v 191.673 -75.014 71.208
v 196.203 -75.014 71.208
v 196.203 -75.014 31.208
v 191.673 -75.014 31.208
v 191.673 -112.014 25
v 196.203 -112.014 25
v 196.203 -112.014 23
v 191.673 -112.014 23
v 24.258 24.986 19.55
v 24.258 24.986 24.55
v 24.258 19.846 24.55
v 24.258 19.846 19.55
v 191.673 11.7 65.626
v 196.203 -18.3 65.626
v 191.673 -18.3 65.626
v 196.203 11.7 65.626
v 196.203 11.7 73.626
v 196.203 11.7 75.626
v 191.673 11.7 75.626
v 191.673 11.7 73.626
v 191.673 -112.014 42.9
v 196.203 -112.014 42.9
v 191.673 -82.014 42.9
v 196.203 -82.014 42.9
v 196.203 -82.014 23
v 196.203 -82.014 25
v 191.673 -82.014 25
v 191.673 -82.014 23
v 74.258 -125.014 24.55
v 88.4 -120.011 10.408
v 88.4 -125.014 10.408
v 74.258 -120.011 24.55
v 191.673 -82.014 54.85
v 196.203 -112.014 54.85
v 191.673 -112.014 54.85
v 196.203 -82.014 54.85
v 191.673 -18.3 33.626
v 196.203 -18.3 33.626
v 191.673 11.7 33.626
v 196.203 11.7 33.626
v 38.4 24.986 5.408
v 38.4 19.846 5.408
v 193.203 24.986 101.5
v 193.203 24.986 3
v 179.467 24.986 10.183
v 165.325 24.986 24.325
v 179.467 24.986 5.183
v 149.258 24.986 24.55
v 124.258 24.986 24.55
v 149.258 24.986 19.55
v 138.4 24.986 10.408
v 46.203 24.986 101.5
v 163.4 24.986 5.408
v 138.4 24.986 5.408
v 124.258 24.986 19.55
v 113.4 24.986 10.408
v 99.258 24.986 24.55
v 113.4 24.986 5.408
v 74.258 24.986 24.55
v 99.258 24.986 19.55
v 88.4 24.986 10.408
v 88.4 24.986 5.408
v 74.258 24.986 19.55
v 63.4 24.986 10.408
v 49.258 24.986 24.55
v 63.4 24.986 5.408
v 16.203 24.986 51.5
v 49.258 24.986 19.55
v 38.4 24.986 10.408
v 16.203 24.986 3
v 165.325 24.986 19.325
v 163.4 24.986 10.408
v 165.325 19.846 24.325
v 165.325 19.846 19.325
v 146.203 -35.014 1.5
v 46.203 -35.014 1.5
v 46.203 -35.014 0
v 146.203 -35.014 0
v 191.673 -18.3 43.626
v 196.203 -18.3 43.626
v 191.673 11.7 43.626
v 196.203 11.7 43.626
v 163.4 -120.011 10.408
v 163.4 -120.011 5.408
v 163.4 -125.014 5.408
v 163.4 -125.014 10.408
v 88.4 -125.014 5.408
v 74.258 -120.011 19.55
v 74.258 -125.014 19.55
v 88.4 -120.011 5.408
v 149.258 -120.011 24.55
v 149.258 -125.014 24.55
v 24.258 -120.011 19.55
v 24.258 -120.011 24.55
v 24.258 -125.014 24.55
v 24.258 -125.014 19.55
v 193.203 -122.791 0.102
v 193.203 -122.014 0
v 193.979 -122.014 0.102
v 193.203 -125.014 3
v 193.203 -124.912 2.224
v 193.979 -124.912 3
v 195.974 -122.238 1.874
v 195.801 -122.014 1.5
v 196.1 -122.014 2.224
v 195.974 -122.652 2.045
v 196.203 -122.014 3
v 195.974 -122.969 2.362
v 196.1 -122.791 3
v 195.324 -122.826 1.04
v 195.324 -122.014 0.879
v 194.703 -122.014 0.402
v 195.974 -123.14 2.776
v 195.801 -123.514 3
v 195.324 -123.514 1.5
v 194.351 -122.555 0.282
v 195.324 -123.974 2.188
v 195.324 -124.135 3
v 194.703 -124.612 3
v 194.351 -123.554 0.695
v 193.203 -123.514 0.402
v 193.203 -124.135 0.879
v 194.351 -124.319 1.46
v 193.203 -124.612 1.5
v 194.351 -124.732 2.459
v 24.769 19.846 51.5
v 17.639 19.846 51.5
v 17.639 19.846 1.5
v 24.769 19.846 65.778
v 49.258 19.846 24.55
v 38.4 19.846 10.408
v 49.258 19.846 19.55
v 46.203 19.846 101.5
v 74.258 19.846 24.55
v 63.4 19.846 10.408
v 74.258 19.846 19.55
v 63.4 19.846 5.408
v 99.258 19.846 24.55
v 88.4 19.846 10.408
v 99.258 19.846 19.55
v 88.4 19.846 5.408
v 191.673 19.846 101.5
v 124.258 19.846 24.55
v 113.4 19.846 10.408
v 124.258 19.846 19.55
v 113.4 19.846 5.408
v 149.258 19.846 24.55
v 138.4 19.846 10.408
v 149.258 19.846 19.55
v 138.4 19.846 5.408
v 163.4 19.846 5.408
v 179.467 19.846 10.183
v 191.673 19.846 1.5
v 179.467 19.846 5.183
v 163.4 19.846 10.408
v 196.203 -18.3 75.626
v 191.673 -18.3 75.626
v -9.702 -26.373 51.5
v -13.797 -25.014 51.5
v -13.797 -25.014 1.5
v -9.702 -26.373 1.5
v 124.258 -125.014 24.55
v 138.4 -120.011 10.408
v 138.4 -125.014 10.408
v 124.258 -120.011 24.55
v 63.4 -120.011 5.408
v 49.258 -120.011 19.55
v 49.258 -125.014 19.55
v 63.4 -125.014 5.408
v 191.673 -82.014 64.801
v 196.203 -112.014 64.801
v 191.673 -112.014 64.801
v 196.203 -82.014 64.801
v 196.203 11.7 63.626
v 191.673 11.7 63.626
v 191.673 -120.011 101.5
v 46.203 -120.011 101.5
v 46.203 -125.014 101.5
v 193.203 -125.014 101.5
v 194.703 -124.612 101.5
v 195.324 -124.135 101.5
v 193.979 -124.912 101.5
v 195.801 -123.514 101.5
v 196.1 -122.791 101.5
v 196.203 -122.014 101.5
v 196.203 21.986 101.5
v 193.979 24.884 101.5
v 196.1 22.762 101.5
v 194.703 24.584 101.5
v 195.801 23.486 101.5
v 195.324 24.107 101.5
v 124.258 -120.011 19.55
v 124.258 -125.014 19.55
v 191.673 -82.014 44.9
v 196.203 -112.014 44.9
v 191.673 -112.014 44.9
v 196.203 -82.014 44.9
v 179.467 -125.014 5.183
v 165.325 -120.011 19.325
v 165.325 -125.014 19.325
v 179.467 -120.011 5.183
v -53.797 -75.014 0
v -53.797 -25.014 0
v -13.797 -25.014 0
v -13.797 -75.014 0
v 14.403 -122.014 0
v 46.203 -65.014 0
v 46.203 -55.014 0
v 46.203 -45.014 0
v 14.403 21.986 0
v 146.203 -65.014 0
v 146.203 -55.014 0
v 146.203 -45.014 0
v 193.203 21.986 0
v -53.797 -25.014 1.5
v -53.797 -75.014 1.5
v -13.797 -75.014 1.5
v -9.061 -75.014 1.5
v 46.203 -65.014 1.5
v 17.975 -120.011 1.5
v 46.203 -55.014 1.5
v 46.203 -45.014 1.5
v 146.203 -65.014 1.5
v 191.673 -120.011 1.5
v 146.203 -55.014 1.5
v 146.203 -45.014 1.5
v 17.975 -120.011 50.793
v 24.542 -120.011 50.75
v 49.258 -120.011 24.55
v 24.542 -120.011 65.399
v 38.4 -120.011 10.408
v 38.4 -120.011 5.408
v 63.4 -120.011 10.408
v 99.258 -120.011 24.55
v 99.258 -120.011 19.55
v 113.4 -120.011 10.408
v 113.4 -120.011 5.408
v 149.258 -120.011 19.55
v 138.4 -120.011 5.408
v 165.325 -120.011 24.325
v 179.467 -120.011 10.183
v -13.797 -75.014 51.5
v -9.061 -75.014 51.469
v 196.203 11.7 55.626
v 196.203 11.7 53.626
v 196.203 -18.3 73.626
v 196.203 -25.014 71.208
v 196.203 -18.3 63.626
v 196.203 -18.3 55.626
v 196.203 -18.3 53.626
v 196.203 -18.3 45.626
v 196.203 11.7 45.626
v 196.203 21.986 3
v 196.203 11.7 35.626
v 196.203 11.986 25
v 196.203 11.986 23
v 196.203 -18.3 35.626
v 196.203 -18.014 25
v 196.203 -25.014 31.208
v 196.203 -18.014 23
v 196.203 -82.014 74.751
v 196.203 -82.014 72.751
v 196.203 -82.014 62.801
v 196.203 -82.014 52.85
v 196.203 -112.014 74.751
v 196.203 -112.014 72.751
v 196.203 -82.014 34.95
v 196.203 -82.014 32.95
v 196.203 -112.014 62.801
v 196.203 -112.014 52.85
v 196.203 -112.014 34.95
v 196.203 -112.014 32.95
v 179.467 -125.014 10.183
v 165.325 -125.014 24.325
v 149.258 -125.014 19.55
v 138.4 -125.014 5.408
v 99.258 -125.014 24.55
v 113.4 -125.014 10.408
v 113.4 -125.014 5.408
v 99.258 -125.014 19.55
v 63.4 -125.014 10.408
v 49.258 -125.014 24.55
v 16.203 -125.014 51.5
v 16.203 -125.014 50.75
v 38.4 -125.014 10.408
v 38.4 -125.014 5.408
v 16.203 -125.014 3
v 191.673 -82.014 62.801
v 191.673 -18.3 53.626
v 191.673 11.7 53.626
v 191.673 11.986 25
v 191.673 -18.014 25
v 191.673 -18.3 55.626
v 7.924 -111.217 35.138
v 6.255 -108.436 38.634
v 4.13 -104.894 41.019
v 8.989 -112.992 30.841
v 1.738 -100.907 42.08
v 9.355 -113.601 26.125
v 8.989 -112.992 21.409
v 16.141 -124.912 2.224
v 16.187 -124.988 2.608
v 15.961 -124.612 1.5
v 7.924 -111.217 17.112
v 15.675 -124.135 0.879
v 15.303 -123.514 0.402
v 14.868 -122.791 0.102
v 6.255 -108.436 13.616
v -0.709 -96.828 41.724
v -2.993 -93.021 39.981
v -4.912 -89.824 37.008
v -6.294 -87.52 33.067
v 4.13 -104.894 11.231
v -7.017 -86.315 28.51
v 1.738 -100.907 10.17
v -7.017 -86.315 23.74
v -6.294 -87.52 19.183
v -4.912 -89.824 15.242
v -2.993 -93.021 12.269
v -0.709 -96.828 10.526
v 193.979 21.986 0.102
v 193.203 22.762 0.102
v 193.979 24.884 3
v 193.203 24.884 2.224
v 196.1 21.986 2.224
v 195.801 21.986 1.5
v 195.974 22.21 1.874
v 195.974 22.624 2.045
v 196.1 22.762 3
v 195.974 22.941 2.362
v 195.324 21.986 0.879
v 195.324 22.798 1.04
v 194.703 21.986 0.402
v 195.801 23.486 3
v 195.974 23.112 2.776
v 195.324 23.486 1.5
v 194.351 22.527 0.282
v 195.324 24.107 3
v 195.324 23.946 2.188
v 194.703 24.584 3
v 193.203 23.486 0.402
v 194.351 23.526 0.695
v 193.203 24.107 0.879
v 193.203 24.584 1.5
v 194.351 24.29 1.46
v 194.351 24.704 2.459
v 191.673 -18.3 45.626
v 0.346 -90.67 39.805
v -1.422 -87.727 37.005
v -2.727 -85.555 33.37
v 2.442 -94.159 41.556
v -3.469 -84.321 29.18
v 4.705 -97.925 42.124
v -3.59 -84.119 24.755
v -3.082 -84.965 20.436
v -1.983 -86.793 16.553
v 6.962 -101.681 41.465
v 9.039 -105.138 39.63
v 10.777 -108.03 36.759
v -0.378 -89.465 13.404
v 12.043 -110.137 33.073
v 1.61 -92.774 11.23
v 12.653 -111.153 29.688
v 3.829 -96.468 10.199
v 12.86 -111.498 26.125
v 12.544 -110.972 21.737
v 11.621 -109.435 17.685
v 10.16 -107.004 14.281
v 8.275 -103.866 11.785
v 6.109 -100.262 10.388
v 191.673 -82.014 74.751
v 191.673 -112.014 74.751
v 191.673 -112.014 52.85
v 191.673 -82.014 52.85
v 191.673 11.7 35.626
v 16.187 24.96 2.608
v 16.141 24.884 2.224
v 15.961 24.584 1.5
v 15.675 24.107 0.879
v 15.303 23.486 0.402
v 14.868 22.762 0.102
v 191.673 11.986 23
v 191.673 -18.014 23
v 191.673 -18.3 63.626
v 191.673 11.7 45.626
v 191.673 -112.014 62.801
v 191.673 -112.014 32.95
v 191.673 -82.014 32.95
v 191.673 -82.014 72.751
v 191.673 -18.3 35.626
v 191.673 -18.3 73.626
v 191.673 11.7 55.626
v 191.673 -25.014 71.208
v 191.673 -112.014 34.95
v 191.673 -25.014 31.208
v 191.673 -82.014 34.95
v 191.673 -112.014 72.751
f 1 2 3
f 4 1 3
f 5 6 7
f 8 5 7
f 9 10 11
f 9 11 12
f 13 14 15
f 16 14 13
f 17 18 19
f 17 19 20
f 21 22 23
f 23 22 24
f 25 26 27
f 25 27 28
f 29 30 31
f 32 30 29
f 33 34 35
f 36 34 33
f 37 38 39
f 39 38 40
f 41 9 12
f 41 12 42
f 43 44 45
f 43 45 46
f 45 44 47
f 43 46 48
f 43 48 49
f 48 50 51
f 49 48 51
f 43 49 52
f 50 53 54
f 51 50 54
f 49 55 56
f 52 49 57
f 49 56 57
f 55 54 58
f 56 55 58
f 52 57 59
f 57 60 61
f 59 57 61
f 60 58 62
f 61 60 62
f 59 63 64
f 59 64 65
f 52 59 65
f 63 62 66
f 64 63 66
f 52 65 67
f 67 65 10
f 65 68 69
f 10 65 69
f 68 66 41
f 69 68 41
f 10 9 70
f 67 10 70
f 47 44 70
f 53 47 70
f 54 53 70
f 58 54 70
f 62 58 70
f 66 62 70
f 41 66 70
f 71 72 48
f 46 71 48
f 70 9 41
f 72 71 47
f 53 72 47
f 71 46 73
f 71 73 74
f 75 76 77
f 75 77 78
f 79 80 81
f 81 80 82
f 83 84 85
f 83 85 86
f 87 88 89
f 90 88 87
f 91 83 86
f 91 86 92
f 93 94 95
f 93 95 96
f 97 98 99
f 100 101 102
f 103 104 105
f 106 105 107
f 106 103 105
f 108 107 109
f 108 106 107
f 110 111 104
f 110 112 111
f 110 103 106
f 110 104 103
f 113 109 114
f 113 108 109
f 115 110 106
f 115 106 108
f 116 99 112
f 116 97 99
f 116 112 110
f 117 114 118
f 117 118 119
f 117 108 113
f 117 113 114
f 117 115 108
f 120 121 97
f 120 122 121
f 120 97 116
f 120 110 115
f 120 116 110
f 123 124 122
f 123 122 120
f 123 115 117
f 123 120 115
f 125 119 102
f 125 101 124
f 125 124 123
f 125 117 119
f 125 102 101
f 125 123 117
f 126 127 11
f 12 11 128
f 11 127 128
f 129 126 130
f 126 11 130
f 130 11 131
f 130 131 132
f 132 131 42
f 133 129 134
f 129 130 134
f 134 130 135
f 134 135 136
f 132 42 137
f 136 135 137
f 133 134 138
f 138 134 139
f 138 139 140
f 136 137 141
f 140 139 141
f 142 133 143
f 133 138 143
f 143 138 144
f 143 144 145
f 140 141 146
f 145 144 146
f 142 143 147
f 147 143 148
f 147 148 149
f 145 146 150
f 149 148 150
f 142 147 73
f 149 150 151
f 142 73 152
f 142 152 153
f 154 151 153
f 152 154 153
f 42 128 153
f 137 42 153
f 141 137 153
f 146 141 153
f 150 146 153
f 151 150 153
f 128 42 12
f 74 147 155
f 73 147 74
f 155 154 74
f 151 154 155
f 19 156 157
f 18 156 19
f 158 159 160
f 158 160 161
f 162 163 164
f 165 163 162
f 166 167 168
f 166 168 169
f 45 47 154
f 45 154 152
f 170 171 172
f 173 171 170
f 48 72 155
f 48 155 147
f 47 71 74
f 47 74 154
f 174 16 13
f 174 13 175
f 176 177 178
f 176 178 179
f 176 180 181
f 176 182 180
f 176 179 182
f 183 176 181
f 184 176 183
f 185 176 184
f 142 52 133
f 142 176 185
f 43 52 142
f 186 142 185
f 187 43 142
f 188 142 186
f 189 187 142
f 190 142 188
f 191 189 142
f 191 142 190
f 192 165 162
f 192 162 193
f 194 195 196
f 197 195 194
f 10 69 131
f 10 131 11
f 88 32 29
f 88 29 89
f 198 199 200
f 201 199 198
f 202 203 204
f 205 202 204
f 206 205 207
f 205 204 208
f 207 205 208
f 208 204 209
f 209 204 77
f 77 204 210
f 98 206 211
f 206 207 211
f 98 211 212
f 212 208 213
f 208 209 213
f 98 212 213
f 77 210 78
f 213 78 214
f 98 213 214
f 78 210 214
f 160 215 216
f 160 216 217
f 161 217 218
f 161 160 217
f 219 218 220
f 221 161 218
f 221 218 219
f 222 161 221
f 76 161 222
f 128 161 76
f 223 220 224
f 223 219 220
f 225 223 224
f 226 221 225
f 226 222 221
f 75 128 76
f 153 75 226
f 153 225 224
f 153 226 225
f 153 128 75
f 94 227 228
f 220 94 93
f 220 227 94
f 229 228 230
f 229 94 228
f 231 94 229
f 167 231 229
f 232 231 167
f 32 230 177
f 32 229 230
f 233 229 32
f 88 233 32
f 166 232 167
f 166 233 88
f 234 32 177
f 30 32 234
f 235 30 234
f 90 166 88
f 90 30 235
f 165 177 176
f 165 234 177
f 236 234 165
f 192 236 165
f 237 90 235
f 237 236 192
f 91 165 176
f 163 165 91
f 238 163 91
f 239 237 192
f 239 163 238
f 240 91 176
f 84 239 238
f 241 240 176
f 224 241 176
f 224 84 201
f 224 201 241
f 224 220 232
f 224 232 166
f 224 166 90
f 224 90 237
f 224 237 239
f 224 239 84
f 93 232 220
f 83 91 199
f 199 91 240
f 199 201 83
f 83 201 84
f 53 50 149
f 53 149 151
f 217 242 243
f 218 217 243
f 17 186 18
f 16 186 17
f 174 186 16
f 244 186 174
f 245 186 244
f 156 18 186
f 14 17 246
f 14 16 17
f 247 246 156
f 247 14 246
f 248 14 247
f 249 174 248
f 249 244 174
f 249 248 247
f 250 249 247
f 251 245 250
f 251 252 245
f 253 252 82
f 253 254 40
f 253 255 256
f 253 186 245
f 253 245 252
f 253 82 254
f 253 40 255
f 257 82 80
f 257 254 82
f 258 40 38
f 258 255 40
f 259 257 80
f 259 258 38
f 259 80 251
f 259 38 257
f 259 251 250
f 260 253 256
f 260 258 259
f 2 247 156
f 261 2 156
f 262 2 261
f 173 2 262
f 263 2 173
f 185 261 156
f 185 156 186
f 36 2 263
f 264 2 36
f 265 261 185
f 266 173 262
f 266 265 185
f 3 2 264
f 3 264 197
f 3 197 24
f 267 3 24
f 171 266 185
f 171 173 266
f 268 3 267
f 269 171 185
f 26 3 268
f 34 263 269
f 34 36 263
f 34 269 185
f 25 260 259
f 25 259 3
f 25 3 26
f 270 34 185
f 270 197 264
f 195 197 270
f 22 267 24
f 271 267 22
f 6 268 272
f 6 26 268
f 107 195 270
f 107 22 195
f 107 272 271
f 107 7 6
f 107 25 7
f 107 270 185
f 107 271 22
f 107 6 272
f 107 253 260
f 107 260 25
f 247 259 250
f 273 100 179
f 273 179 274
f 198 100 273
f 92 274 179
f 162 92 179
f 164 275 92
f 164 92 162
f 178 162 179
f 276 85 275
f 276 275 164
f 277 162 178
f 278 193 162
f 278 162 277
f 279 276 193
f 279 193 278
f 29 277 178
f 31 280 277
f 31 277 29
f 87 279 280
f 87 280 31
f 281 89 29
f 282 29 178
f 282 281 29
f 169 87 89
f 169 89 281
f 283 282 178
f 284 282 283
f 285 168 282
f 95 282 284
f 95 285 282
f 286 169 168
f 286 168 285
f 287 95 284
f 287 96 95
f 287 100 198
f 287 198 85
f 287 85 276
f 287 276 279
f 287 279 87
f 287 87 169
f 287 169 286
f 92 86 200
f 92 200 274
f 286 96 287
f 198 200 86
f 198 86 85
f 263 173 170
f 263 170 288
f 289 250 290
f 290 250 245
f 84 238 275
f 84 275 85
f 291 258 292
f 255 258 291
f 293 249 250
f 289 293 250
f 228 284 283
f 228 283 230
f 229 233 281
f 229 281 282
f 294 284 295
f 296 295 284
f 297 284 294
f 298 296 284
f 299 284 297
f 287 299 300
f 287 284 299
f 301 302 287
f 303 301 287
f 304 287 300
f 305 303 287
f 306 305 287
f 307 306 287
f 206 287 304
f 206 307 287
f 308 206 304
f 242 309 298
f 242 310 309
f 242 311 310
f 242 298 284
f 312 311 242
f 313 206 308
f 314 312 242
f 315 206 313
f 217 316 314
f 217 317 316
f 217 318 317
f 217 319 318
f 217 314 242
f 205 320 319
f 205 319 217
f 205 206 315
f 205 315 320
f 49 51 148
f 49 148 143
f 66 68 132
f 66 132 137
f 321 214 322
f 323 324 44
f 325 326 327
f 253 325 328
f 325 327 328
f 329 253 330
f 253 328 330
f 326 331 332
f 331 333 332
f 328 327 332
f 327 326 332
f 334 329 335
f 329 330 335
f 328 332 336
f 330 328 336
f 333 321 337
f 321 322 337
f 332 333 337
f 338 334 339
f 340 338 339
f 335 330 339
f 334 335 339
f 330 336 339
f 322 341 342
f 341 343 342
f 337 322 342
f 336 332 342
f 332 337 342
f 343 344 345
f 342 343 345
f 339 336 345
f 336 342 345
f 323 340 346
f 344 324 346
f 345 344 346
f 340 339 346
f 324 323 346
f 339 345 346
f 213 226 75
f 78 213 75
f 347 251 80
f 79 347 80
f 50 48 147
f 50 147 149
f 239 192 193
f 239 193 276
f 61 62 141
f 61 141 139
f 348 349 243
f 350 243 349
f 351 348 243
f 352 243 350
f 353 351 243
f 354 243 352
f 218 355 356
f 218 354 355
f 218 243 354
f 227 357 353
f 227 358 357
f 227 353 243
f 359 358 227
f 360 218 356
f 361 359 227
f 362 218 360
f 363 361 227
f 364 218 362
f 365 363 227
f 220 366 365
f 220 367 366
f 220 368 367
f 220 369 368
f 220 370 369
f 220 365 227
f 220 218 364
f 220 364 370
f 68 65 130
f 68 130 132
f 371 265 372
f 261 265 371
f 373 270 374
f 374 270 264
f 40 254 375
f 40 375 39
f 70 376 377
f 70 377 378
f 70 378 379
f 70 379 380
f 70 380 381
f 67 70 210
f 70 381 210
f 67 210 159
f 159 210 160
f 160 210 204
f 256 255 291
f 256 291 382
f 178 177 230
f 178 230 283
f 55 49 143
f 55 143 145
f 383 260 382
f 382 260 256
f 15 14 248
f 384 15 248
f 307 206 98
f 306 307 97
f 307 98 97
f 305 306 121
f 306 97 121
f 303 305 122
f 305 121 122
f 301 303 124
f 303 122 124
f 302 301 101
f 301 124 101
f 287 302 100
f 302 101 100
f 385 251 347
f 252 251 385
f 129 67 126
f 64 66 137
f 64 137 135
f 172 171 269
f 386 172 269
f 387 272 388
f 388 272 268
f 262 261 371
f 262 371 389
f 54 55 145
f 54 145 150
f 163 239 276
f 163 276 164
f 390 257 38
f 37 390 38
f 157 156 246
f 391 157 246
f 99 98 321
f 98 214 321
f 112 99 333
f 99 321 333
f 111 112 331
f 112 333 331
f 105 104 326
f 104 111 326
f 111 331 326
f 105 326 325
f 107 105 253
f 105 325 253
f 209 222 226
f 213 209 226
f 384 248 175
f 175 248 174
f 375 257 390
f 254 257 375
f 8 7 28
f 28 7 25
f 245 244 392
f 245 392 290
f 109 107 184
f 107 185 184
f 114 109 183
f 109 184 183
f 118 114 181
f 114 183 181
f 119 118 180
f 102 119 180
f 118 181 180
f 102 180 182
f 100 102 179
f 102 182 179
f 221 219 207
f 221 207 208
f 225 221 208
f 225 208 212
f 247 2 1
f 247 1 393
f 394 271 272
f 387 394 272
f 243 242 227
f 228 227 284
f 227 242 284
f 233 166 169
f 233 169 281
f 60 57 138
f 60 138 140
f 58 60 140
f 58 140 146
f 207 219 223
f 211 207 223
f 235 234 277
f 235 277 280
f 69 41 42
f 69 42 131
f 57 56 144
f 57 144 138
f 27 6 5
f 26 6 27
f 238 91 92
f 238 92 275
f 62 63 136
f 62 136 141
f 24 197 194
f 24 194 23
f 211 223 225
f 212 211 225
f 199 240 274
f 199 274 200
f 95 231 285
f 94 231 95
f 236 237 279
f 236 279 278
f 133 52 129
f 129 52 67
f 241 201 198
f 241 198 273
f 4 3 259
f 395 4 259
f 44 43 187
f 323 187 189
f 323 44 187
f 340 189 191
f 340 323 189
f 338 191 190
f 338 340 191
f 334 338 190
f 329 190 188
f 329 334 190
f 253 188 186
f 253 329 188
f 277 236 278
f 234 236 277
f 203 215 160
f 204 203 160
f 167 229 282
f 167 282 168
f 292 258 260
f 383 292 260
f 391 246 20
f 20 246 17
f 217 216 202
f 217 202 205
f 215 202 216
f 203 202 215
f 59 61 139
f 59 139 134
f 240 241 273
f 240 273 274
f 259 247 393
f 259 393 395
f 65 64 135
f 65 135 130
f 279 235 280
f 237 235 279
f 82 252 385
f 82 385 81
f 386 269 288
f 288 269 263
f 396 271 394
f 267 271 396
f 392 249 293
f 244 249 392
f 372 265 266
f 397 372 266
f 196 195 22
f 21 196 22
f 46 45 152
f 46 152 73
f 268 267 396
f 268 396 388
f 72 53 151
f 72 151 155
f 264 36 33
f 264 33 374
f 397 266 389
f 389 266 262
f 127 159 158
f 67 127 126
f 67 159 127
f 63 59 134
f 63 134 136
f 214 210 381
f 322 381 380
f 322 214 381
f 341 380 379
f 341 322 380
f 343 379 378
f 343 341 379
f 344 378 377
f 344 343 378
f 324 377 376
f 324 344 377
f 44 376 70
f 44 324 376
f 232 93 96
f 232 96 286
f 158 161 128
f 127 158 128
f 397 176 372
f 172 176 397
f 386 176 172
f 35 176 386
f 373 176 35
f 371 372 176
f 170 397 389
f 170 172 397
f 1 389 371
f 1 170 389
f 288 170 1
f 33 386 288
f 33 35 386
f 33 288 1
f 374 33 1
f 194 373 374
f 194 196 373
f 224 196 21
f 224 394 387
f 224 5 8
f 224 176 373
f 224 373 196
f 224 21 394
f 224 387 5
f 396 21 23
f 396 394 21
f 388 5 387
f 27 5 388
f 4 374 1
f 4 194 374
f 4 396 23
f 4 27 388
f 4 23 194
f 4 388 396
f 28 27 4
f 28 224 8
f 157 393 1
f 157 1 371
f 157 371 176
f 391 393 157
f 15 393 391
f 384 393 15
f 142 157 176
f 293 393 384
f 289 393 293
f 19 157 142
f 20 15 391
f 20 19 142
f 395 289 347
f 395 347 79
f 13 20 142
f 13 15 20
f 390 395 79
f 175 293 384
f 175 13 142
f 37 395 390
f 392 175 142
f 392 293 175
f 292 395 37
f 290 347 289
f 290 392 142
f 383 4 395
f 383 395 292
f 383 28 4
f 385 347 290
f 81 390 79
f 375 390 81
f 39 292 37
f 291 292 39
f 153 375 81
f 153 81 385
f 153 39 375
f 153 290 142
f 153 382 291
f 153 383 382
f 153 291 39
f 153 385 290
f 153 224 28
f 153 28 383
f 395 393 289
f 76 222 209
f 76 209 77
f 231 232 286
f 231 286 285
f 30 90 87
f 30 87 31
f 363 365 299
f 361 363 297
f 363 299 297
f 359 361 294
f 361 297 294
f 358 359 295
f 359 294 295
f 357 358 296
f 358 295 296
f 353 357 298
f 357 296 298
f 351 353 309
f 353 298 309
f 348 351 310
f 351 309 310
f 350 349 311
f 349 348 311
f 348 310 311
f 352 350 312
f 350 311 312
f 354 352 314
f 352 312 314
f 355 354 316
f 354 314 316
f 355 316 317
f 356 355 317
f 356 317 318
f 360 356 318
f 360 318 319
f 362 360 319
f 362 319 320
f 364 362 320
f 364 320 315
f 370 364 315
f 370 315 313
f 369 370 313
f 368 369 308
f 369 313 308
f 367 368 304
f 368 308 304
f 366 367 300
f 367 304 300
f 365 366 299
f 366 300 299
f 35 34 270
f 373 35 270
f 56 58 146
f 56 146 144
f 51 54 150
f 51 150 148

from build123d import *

# Parameters (mm, degrees)
SKETCH_1_W           = 250
SKETCH_1_H           = 150
EXTRUDE_1_DEPTH      = 1.5
SKETCH_2_W           = 40
SKETCH_2_H           = 50
CUT_EXTRUDE_1_DEPTH  = 233.650381036
SKETCH_3_W           = 40
SKETCH_3_H           = 50
CUT_EXTRUDE_2_DEPTH  = 233.650381036
CUT_EXTRUDE_3_DEPTH  = 233.650381036
SKETCH_5_W           = 100
SKETCH_5_H           = 10
CUT_EXTRUDE_4_DEPTH  = 233.650381036
EXTRUDE_2_DEPTH      = 100
EXTRUDE_3_DEPTH      = 100
CUT_EXTRUDE_5_DEPTH  = 268.016260599
CUT_EXTRUDE_7_DEPTH  = 10
SKETCH_14_W          = 50
SKETCH_14_H          = 58.309518949
CUT_EXTRUDE_10_DEPTH = 10
SKETCH_15_R          = 16
CUT_EXTRUDE_11_DEPTH = 10
CUT_EXTRUDE_14_DEPTH = 268.016260599
SKETCH_20_W          = 40
SKETCH_20_H          = 50
CUT_EXTRUDE_15_DEPTH = 10
FILLET_1_R           = 3
SKETCH_21_W          = 2
SKETCH_21_H          = 30
CUT_EXTRUDE_16_DEPTH = 10


with BuildPart() as part:
    # 草图1 → 凸台-拉伸1 (new body)
    with BuildSketch(Plane.XY):
        with Locations((71.202531646, -50.014064698)):
            Rectangle(SKETCH_1_W, SKETCH_1_H)
    extrude(amount=EXTRUDE_1_DEPTH)

    # 草图2 → 切除-拉伸1 (cut, through all)
    with BuildSketch(Plane.XY.offset(1.5)):
        with Locations((-33.797468354, -0.014064698)):
            Rectangle(SKETCH_2_W, SKETCH_2_H)
    extrude(amount=-CUT_EXTRUDE_1_DEPTH, mode=Mode.SUBTRACT)

    # 草图3 → 切除-拉伸2 (cut, through all)
    with BuildSketch(Plane.XY.offset(1.5)):
        with Locations((-33.797468354, -100.014064698)):
            Rectangle(SKETCH_3_W, SKETCH_3_H)
    extrude(amount=-CUT_EXTRUDE_2_DEPTH, mode=Mode.SUBTRACT)

    # 草图4 → 切除-拉伸3 (cut, through all)
    with BuildSketch(Plane.XY.offset(1.5)):
        Polygon((-13.797468354, -75.014064698), (16.202531646, -125.014064698), (-13.797468354, -125.014064698), align=None)
        Polygon((-13.797468354, -25.014064698), (16.202531646, 24.985935302), (-13.797468354, 24.985935302), align=None)
    extrude(amount=-CUT_EXTRUDE_3_DEPTH, mode=Mode.SUBTRACT)

    # 草图5 → 切除-拉伸4 (cut, through all)
    with BuildSketch(Plane.XY.offset(1.5)):
        with Locations((96.202531646, -60.014064698)):
            Rectangle(SKETCH_5_W, SKETCH_5_H)
        with Locations((96.202531646, -40.014064698)):
            Rectangle(SKETCH_5_W, SKETCH_5_H)
    extrude(amount=-CUT_EXTRUDE_4_DEPTH, mode=Mode.SUBTRACT)

    # 草图6 → 凸台-拉伸2 (add)
    with BuildSketch(Plane.XY.offset(1.5)):
        Polygon((-13.797468354, -75.014064698), (-9.06108927, -75.014064698), (17.975201528, -120.010528641), (191.672994216, -120.010528641), (191.672994216, 24.985935302), (196.202531646, 24.985935302), (196.202531646, -125.014064698), (16.202531646, -125.014064698), align=None)
    extrude(amount=EXTRUDE_2_DEPTH)

    # 草图7 → 凸台-拉伸3 (add)
    with BuildSketch(Plane.XY.offset(1.5)):
        Polygon((-9.70187004, -26.373391519), (17.639126857, 19.845802477), (191.672994216, 19.845802477), (191.672994216, 24.985935302), (16.202531646, 24.985935302), (-13.797468354, -25.014064698), align=None)
    extrude(amount=EXTRUDE_3_DEPTH)

    # 草图8 → 切除-拉伸5 (cut, through all)
    with BuildSketch(Plane(origin=(0, 24.985935302, 0), x_dir=(1, 0, 0), z_dir=(0, 1, 0))):
        Polygon((179.466999768, -10.18289615), (165.324864144, -24.325031774), (165.324864144, -19.325031774), (179.466999768, -5.18289615), align=None)
        Polygon((163.399705406, -10.407679967), (149.257569782, -24.549815591), (149.257569782, -19.549815591), (163.399705406, -5.407679967), align=None)
        Polygon((124.257569782, -24.549815591), (124.257569782, -19.549815591), (138.399705406, -5.407679967), (138.399705406, -10.407679967), align=None)
        Polygon((99.257569782, -24.549815591), (99.257569782, -19.549815591), (113.399705406, -5.407679967), (113.399705406, -10.407679967), align=None)
        Polygon((74.257569782, -24.549815591), (74.257569782, -19.549815591), (88.399705406, -5.407679967), (88.399705406, -10.407679967), align=None)
        Polygon((49.257569782, -24.549815591), (49.257569782, -19.549815591), (63.399705406, -5.407679967), (63.399705406, -10.407679967), align=None)
        Polygon((24.257569782, -24.549815591), (24.257569782, -19.549815591), (38.399705406, -5.407679967), (38.399705406, -10.407679967), align=None)
    extrude(amount=-CUT_EXTRUDE_5_DEPTH, mode=Mode.SUBTRACT)

    # 草图11 → 切除-拉伸7 (cut)
    with BuildSketch(Plane(origin=(-43.239637627, -25.943782576, 0), x_dir=(0, 0, 1), z_dir=(-0.8574929257125441, -0.5144957554275268, 0))):
        Polygon((101.5, -57.225290903), (51.5, -57.225290903), (50.75, -115.534809852), (101.5, -115.534809852), align=None)
    extrude(amount=-CUT_EXTRUDE_7_DEPTH, mode=Mode.SUBTRACT)

    # 草图14 → 切除-拉伸10 (cut)
    with BuildSketch(Plane(origin=(0.890419459, -0.534251675, 0), x_dir=(0, 0, 1), z_dir=(-0.8574929257125442, 0.5144957554275266, 0))):
        with Locations((76.5, 0.606637048)):
            Rectangle(SKETCH_14_W, SKETCH_14_H)
    extrude(amount=-CUT_EXTRUDE_10_DEPTH, mode=Mode.SUBTRACT)

    # 草图15 → 切除-拉伸11 (cut)
    with BuildSketch(Plane(origin=(-43.239637627, -25.943782576, 0), x_dir=(0, 0, 1), z_dir=(-0.8574929257125441, -0.5144957554275268, 0))):
        with Locations(Location((26.124922648, -86.225290903, 0), (0, 0, 270))):
            Circle(SKETCH_15_R)
    extrude(amount=-CUT_EXTRUDE_11_DEPTH, mode=Mode.SUBTRACT)

    # 草图19 → 切除-拉伸14 (cut, through all)
    with BuildSketch(Plane(origin=(0, 24.985935302, 0), x_dir=(1, 0, 0), z_dir=(0, 1, 0))):
        Polygon((46.202531646, -101.5), (16.202531646, -51.5), (16.202531646, -101.5), align=None)
    extrude(amount=-CUT_EXTRUDE_14_DEPTH, mode=Mode.SUBTRACT)

    # 草图20 → 切除-拉伸15 (cut)
    with BuildSketch(Plane(origin=(196.202531646, 0, 0), x_dir=(0, 0, -1), z_dir=(1, 0, 0))):
        with Locations((-51.207849099, -50.014064698)):
            Rectangle(SKETCH_20_W, SKETCH_20_H)
    extrude(amount=-CUT_EXTRUDE_15_DEPTH, mode=Mode.SUBTRACT)

    # 圆角1
    fillet_1_edges = [part.edges().sort_by_distance(p)[0] for p in [
        (106.202531646, -125.014064698, 0),
        (106.202531646, 24.985935302, 0),
        (196.202531646, -50.014064698, 0),
        (196.202531646, 24.985935302, 50.75),
        (196.202531646, -125.014064698, 50.75),
    ]]
    fillet(fillet_1_edges, radius=FILLET_1_R)

    # 草图21 → 切除-拉伸16 (cut)
    with BuildSketch(Plane(origin=(196.202531646, 0, 0), x_dir=(0, 0, -1), z_dir=(1, 0, 0))):
        with Locations((-63.800605611, -97.014064698)):
            Rectangle(SKETCH_21_W, SKETCH_21_H)
        with Locations((-73.750757013, -97.014064698)):
            Rectangle(SKETCH_21_W, SKETCH_21_H)
        with Locations((-53.850454208, -97.014064698)):
            Rectangle(SKETCH_21_W, SKETCH_21_H)
        with Locations((-43.900302805, -97.014064698)):
            Rectangle(SKETCH_21_W, SKETCH_21_H)
        with Locations((-33.950151403, -97.014064698)):
            Rectangle(SKETCH_21_W, SKETCH_21_H)
        with Locations((-24, -97.014064698)):
            Rectangle(SKETCH_21_W, SKETCH_21_H)
        with Locations((-64.626123933, -3.300353784)):
            Rectangle(SKETCH_21_W, SKETCH_21_H)
        with Locations((-74.626123933, -3.300353784)):
            Rectangle(SKETCH_21_W, SKETCH_21_H)
        with Locations((-54.626123933, -3.300353784)):
            Rectangle(SKETCH_21_W, SKETCH_21_H)
        with Locations((-44.626123933, -3.300353784)):
            Rectangle(SKETCH_21_W, SKETCH_21_H)
        with Locations((-34.626123933, -3.300353784)):
            Rectangle(SKETCH_21_W, SKETCH_21_H)
        with Locations((-24, -3.014064698)):
            Rectangle(SKETCH_21_W, SKETCH_21_H)
    extrude(amount=-CUT_EXTRUDE_16_DEPTH, mode=Mode.SUBTRACT)


solid = part.part
